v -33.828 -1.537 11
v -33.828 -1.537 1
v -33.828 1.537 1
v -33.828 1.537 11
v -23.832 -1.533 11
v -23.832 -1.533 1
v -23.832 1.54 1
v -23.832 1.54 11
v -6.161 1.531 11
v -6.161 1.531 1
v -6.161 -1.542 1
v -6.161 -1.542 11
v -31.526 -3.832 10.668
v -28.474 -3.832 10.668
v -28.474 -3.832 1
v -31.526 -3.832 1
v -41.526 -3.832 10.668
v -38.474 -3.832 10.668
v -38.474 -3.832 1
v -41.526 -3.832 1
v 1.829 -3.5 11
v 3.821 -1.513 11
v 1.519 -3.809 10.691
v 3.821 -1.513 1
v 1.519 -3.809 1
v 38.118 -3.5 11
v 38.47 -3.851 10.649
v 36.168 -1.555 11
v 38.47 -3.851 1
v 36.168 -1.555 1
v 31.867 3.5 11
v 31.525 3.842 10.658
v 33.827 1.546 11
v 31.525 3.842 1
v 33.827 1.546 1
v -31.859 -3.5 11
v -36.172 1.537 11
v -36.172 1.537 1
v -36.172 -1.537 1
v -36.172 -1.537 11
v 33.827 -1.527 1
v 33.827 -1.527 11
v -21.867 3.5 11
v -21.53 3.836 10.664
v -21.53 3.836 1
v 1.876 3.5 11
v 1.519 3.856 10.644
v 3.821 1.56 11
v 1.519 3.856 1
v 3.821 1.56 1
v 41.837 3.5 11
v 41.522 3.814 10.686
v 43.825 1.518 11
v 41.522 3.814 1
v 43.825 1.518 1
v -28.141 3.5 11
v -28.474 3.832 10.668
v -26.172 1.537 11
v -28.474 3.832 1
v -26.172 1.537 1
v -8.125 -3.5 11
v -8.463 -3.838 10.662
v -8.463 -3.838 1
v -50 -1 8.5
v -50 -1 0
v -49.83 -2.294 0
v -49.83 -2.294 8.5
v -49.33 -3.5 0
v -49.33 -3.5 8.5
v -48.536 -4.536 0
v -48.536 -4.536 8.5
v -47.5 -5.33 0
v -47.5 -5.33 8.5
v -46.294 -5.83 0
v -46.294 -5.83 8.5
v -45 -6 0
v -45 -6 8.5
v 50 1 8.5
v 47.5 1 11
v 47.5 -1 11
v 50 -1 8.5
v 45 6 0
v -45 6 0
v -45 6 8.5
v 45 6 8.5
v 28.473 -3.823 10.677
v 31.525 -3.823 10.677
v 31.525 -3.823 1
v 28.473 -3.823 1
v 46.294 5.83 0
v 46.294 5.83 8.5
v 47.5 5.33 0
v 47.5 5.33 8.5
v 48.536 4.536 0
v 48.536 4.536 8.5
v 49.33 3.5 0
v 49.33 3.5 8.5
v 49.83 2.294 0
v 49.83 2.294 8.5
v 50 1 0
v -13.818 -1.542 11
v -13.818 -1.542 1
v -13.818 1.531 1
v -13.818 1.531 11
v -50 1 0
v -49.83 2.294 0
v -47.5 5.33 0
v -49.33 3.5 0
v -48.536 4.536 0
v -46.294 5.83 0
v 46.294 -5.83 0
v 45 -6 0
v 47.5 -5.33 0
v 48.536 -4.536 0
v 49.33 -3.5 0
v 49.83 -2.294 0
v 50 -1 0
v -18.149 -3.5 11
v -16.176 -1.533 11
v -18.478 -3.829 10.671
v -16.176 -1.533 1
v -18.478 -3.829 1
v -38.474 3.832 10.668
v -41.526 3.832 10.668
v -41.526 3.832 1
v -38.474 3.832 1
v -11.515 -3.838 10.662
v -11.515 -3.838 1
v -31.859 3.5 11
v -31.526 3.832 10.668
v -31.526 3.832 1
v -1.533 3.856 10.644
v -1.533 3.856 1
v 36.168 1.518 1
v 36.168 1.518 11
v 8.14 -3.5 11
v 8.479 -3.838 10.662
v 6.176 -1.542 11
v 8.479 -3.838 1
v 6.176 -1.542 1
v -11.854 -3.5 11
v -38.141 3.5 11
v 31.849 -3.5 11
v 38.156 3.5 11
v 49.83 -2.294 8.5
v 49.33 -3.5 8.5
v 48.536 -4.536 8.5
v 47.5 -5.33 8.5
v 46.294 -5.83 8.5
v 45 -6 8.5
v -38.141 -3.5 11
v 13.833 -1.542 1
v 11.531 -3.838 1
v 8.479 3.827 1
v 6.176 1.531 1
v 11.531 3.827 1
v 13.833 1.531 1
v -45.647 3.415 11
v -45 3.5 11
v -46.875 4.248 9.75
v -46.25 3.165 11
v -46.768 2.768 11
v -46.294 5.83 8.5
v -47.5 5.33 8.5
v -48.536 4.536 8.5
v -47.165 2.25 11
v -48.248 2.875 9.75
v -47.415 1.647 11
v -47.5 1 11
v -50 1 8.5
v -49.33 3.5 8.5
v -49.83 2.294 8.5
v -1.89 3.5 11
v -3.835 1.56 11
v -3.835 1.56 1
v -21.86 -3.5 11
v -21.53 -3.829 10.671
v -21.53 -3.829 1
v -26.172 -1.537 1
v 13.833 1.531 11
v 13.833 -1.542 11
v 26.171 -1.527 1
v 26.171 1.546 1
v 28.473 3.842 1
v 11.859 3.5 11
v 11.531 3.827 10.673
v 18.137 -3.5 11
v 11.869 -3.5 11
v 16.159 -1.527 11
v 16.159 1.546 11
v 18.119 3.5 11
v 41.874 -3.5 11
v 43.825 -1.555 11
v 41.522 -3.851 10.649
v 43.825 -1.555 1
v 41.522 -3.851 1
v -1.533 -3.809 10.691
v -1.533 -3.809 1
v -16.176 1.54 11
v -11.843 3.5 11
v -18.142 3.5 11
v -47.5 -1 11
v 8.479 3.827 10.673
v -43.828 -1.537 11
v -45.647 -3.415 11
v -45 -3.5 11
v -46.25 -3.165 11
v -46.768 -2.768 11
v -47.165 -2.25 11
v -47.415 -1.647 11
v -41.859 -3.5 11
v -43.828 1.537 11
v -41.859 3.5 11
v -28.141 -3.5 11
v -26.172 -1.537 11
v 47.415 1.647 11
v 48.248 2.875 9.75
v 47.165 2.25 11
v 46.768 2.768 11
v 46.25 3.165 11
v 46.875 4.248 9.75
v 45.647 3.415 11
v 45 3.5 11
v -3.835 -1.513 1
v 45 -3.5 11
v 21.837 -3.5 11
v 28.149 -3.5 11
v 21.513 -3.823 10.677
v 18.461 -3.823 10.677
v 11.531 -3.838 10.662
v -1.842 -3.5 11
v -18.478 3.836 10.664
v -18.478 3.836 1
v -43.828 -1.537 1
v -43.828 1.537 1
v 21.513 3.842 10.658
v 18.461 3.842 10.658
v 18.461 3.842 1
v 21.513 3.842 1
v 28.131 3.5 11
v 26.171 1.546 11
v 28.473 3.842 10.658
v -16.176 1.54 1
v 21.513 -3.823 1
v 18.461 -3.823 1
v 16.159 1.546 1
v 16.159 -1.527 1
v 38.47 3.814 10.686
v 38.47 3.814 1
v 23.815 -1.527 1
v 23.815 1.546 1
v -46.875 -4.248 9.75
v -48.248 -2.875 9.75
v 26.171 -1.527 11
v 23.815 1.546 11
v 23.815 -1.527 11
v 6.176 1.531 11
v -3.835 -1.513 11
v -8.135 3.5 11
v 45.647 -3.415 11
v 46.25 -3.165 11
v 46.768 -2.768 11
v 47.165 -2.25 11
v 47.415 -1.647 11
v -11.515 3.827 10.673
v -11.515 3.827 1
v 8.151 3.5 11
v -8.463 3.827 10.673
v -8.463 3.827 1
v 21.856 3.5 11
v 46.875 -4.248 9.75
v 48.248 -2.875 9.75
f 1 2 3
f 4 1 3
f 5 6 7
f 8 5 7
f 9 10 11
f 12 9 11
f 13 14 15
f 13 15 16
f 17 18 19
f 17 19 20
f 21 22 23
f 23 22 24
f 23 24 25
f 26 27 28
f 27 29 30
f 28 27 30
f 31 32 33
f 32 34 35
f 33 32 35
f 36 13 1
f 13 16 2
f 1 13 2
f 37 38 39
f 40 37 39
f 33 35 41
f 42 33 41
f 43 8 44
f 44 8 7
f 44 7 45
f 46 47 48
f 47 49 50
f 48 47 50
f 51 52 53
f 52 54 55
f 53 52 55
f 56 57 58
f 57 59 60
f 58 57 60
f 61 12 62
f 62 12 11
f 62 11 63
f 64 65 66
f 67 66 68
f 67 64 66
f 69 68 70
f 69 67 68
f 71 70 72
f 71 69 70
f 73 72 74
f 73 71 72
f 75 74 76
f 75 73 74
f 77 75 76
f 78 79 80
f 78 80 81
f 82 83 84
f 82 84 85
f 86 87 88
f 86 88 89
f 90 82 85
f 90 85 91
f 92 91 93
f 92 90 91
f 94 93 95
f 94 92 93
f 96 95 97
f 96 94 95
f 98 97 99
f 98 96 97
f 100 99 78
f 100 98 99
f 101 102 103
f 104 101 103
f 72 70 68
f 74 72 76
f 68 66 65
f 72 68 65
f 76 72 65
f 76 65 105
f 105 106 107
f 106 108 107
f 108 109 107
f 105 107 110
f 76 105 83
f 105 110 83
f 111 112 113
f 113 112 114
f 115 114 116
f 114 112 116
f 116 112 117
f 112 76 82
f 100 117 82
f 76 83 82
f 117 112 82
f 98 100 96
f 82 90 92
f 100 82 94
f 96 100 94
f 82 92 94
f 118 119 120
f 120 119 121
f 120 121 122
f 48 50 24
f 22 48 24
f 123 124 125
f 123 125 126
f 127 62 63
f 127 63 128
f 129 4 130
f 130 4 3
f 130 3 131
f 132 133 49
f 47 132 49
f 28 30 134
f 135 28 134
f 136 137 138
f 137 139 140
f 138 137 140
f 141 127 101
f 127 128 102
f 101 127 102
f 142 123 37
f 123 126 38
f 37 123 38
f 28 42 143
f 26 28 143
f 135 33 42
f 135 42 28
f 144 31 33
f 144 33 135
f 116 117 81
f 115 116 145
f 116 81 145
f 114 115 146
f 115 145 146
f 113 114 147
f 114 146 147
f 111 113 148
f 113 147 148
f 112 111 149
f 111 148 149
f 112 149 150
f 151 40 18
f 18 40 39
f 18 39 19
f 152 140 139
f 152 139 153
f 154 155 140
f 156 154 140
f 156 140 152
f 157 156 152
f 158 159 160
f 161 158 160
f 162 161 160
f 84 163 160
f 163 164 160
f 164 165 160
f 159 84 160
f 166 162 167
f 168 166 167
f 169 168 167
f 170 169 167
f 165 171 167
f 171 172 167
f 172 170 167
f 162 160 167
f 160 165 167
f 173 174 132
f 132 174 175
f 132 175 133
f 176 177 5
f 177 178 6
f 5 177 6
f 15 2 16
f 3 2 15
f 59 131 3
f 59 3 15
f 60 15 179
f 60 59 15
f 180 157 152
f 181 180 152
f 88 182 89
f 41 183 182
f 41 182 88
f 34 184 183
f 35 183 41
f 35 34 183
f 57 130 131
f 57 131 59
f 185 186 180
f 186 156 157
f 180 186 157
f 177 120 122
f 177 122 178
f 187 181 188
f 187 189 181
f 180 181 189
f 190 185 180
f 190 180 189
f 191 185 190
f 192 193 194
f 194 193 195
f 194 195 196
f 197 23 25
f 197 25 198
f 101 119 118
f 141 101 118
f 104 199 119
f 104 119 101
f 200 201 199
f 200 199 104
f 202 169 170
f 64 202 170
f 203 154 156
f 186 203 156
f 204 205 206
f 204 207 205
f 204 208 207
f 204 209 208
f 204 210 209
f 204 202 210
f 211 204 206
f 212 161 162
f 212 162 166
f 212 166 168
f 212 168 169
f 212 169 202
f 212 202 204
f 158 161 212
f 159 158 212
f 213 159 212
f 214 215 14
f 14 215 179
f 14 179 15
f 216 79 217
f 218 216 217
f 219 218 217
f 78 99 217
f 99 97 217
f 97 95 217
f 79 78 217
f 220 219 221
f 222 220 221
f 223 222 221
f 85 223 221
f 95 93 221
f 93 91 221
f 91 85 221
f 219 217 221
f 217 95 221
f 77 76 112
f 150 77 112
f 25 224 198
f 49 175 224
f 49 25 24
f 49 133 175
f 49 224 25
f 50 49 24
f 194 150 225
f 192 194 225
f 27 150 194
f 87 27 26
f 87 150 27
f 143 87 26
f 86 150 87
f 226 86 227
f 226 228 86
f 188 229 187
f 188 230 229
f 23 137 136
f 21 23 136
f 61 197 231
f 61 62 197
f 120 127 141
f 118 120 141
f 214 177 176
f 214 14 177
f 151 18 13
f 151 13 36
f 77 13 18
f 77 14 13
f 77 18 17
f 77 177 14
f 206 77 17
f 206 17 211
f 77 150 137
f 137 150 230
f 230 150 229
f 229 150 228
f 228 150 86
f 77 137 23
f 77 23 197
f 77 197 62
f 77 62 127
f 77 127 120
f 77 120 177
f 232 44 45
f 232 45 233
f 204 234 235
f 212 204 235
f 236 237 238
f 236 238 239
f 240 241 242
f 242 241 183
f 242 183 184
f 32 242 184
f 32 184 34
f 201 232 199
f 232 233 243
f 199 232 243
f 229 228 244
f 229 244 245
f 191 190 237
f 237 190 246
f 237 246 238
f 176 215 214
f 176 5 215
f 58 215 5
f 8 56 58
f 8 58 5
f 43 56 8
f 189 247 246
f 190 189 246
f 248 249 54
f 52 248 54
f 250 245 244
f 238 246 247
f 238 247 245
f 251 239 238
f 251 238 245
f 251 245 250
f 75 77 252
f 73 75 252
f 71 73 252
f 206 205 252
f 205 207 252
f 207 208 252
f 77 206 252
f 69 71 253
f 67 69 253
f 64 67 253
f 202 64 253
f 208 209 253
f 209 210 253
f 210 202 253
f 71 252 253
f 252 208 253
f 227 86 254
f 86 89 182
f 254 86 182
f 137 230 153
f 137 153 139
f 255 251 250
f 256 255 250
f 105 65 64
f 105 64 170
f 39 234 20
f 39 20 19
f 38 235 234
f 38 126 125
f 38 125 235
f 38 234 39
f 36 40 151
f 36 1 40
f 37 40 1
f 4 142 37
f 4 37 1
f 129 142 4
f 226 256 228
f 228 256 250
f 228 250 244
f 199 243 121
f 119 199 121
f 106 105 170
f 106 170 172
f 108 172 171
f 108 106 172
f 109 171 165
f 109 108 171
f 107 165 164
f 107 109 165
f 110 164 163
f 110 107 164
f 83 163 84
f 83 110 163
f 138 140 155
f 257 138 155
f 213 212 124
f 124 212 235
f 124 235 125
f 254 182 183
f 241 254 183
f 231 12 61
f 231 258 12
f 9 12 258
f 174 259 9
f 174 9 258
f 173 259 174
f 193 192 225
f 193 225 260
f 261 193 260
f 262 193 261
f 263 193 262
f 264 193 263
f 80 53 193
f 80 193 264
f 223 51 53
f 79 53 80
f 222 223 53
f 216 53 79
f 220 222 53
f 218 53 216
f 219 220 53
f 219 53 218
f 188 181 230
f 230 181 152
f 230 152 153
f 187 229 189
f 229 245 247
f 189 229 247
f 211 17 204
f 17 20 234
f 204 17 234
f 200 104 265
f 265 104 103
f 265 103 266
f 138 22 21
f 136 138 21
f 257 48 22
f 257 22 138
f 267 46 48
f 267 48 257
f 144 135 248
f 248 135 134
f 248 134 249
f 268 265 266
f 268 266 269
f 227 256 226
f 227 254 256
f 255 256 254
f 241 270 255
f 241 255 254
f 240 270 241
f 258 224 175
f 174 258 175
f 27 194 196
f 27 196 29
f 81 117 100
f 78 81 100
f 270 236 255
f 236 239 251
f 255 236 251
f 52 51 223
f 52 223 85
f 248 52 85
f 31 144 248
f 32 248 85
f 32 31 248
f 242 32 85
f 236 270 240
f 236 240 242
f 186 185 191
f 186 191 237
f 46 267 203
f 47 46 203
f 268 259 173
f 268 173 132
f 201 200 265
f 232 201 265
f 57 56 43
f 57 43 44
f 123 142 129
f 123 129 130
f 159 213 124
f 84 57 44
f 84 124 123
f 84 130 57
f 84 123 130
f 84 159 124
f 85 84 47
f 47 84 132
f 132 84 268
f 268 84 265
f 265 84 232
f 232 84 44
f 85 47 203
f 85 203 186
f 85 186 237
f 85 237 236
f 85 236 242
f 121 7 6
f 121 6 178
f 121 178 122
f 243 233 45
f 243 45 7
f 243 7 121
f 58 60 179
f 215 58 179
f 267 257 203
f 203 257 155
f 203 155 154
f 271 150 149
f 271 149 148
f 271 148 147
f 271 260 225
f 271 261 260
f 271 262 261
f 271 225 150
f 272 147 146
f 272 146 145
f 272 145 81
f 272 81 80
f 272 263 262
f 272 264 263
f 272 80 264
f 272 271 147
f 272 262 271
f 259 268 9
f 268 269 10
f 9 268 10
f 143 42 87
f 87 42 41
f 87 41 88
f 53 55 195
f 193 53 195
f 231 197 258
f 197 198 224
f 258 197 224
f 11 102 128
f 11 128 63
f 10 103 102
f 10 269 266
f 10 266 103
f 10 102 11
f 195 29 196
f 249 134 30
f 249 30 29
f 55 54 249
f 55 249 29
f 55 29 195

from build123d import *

# Parameters (mm, degrees)
F0_W         = 100
F0_H         = 12
F1_DEPTH     = 11
F0_W_2       = 2.3021356216
F0_H_2       = 3.0731172886
F0_W_3       = 3.0519974387
F0_H_3       = 2.2957974076
F2_DEPTH     = 1
F3_R         = 5
F4_T1_DEPTH  = 90
F4_T3_DEPTH  = 2
F4_T6_ANGLE  = 90
F4_T8_ANGLE  = 90
F4_T10_ANGLE = 90
F4_T12_ANGLE = 90


# Not quite as in the source:
# - a fillet or chamfer that OpenCascade refuses, or shapes differently, is made with other operations: its cross-section is extruded or revolved along the edge and cut away or added


with BuildPart() as f1:
    # F0 (on Top) → F1 (new body)
    with BuildSketch(Plane.XY):
        Rectangle(F0_W, F0_H)
        Polygon((-43.828134341, 1.5365586443), (-41.5259987194, 3.8323560519), (-38.4740012806, 3.8323560519), (-36.171865659, 1.5365586443), (-36.171865659, -1.5365586443), (-38.4740012806, -3.8323560519), (-41.5259987194, -3.8323560519), (-43.828134341, -1.5365586443), align=None, mode=Mode.SUBTRACT)
        Polygon((-13.8175263533, 1.5313583214), (-11.5153907317, 3.827155729), (-8.463393293, 3.827155729), (-6.1612576714, 1.5313583214), (-6.1612576714, -1.5417589672), (-8.463393293, -3.8375563748), (-11.5153907317, -3.8375563748), (-13.8175263533, -1.5417589672), align=None, mode=Mode.SUBTRACT)
        Polygon((6.1764764136, 1.531357914), (8.4786120352, 3.8271553215), (11.5306094739, 3.8271553215), (13.8327450955, 1.531357914), (13.8327450955, -1.5417593747), (11.5306094739, -3.8375567823), (8.4786120352, -3.8375567823), (6.1764764136, -1.5417593747), align=None, mode=Mode.SUBTRACT)
        Polygon((36.1682959368, 1.5178143587), (38.4704315585, 3.8136117663), (41.5224289972, 3.8136117663), (43.8245646188, 1.5178143587), (43.8245646188, -1.5553029299), (41.5224289972, -3.8511003375), (38.4704315585, -3.8511003375), (36.1682959368, -1.5553029299), align=None, mode=Mode.SUBTRACT)
        Polygon((-33.8281344609, 1.5365587602), (-31.5259988393, 3.8323561678), (-28.4740014006, 3.8323561678), (-26.1718657789, 1.5365587602), (-26.1718657789, -1.5365585284), (-28.4740014006, -3.832355936), (-31.5259988393, -3.832355936), (-33.8281344609, -1.5365585284), align=None, mode=Mode.SUBTRACT)
        Polygon((-23.8324813077, 1.5400278102), (-21.5303456861, 3.8358252178), (-18.4783482474, 3.8358252178), (-16.1762126258, 1.5400278102), (-16.1762126258, -1.5330894784), (-18.4783482474, -3.828886886), (-21.5303456861, -3.828886886), (-23.8324813077, -1.5330894784), align=None, mode=Mode.SUBTRACT)
        Polygon((-3.8348879394, 1.5600861226), (-1.5327523178, 3.8558835302), (1.5192451209, 3.8558835302), (3.8213807426, 1.5600861226), (3.8213807426, -1.513031166), (1.5192451209, -3.8088285736), (-1.5327523178, -3.8088285736), (-3.8348879394, -1.513031166), align=None, mode=Mode.SUBTRACT)
        Polygon((16.1591154059, 1.5457221845), (18.4612510276, 3.8415195921), (21.5132484663, 3.8415195921), (23.8153840879, 1.5457221845), (23.8153840879, -1.5273951041), (21.5132484663, -3.8231925117), (18.4612510276, -3.8231925117), (16.1591154059, -1.5273951041), align=None, mode=Mode.SUBTRACT)
        Polygon((26.1708870998, 1.5457229285), (28.4730227214, 3.8415203361), (31.5250201601, 3.8415203361), (33.8271557817, 1.5457229285), (33.8271557817, -1.5273943601), (31.5250201601, -3.8231917677), (28.4730227214, -3.8231917677), (26.1708870998, -1.5273943601), align=None, mode=Mode.SUBTRACT)
    extrude(amount=F1_DEPTH)

    # F0 (on Top) → F2 (join)
    with BuildSketch(Plane.XY):
        Rectangle(F0_W, F0_H)
        Polygon((-43.828134341, 1.5365586443), (-41.5259987194, 3.8323560519), (-38.4740012806, 3.8323560519), (-36.171865659, 1.5365586443), (-36.171865659, -1.5365586443), (-38.4740012806, -3.8323560519), (-41.5259987194, -3.8323560519), (-43.828134341, -1.5365586443), align=None, mode=Mode.SUBTRACT)
        Polygon((-13.8175263533, 1.5313583214), (-11.5153907317, 3.827155729), (-8.463393293, 3.827155729), (-6.1612576714, 1.5313583214), (-6.1612576714, -1.5417589672), (-8.463393293, -3.8375563748), (-11.5153907317, -3.8375563748), (-13.8175263533, -1.5417589672), align=None, mode=Mode.SUBTRACT)
        Polygon((6.1764764136, 1.531357914), (8.4786120352, 3.8271553215), (11.5306094739, 3.8271553215), (13.8327450955, 1.531357914), (13.8327450955, -1.5417593747), (11.5306094739, -3.8375567823), (8.4786120352, -3.8375567823), (6.1764764136, -1.5417593747), align=None, mode=Mode.SUBTRACT)
        Polygon((36.1682959368, 1.5178143587), (38.4704315585, 3.8136117663), (41.5224289972, 3.8136117663), (43.8245646188, 1.5178143587), (43.8245646188, -1.5553029299), (41.5224289972, -3.8511003375), (38.4704315585, -3.8511003375), (36.1682959368, -1.5553029299), align=None, mode=Mode.SUBTRACT)
        Polygon((-33.8281344609, 1.5365587602), (-31.5259988393, 3.8323561678), (-28.4740014006, 3.8323561678), (-26.1718657789, 1.5365587602), (-26.1718657789, -1.5365585284), (-28.4740014006, -3.832355936), (-31.5259988393, -3.832355936), (-33.8281344609, -1.5365585284), align=None, mode=Mode.SUBTRACT)
        Polygon((-23.8324813077, 1.5400278102), (-21.5303456861, 3.8358252178), (-18.4783482474, 3.8358252178), (-16.1762126258, 1.5400278102), (-16.1762126258, -1.5330894784), (-18.4783482474, -3.828886886), (-21.5303456861, -3.828886886), (-23.8324813077, -1.5330894784), align=None, mode=Mode.SUBTRACT)
        Polygon((-3.8348879394, 1.5600861226), (-1.5327523178, 3.8558835302), (1.5192451209, 3.8558835302), (3.8213807426, 1.5600861226), (3.8213807426, -1.513031166), (1.5192451209, -3.8088285736), (-1.5327523178, -3.8088285736), (-3.8348879394, -1.513031166), align=None, mode=Mode.SUBTRACT)
        Polygon((16.1591154059, 1.5457221845), (18.4612510276, 3.8415195921), (21.5132484663, 3.8415195921), (23.8153840879, 1.5457221845), (23.8153840879, -1.5273951041), (21.5132484663, -3.8231925117), (18.4612510276, -3.8231925117), (16.1591154059, -1.5273951041), align=None, mode=Mode.SUBTRACT)
        Polygon((26.1708870998, 1.5457229285), (28.4730227214, 3.8415203361), (31.5250201601, 3.8415203361), (33.8271557817, 1.5457229285), (33.8271557817, -1.5273943601), (31.5250201601, -3.8231917677), (28.4730227214, -3.8231917677), (26.1708870998, -1.5273943601), align=None, mode=Mode.SUBTRACT)
        with Locations((-42.6770665302, 0)):
            Rectangle(F0_W_2, F0_H_2)
        Polygon((-41.5259987194, 1.5365586443), (-41.5259987194, 3.8323560519), (-43.828134341, 1.5365586443), align=None)
        with Locations((-40, 2.6844573481)):
            Rectangle(F0_W_3, F0_H_3)
        Polygon((-41.5259987194, -3.8323560519), (-41.5259987194, -1.5365586443), (-43.828134341, -1.5365586443), align=None)
        with Locations((-40, -2.6844573481)):
            Rectangle(F0_W_3, F0_H_3)
        with Locations((-40, 0)):
            Rectangle(F0_W_3, F0_H_2)
        with Locations((-37.3229334698, 0)):
            Rectangle(F0_W_2, F0_H_2)
        Polygon((-36.171865659, 1.5365586443), (-38.4740012806, 3.8323560519), (-38.4740012806, 1.5365586443), align=None)
        Polygon((-36.171865659, -1.5365586443), (-38.4740012806, -1.5365586443), (-38.4740012806, -3.8323560519), align=None)
        Polygon((-31.5259988393, -3.832355936), (-31.5259988393, -1.5365585284), (-33.8281344609, -1.5365585284), align=None)
        with Locations((-32.6770666501, 1.159e-07)):
            Rectangle(F0_W_2, F0_H_2)
        Polygon((-31.5259988393, 1.5365587602), (-31.5259988393, 3.8323561678), (-33.8281344609, 1.5365587602), align=None)
        with Locations((-30.0000001199, 2.684457464)):
            Rectangle(F0_W_3, F0_H_3)
        Polygon((-26.1718657789, 1.5365587602), (-28.4740014006, 3.8323561678), (-28.4740014006, 1.5365587602), align=None)
        with Locations((-27.3229335898, 1.159e-07)):
            Rectangle(F0_W_2, F0_H_2)
        with Locations((-30.0000001199, 1.159e-07)):
            Rectangle(F0_W_3, F0_H_2)
        with Locations((-30.0000001199, -2.6844572322)):
            Rectangle(F0_W_3, F0_H_3)
        Polygon((-26.1718657789, -1.5365585284), (-28.4740014006, -1.5365585284), (-28.4740014006, -3.832355936), align=None)
        Polygon((-21.5303456861, -3.828886886), (-21.5303456861, -1.5330894784), (-23.8324813077, -1.5330894784), align=None)
        with Locations((-22.6814134969, 0.0034691659)):
            Rectangle(F0_W_2, F0_H_2)
        Polygon((-21.5303456861, 1.5400278102), (-21.5303456861, 3.8358252178), (-23.8324813077, 1.5400278102), align=None)
        with Locations((-20.0043469667, 2.687926514)):
            Rectangle(F0_W_3, F0_H_3)
        with Locations((-20.0043469667, 0.0034691659)):
            Rectangle(F0_W_3, F0_H_2)
        with Locations((-20.0043469667, -2.6809881822)):
            Rectangle(F0_W_3, F0_H_3)
        Polygon((-16.1762126258, -1.5330894784), (-18.4783482474, -1.5330894784), (-18.4783482474, -3.828886886), align=None)
        with Locations((-17.3272804366, 0.0034691659)):
            Rectangle(F0_W_2, F0_H_2)
        Polygon((-16.1762126258, 1.5400278102), (-18.4783482474, 3.8358252178), (-18.4783482474, 1.5400278102), align=None)
        Polygon((-11.5153907317, 1.5313583214), (-11.5153907317, 3.827155729), (-13.8175263533, 1.5313583214), align=None)
        with Locations((-12.6664585425, -0.0052003229)):
            Rectangle(F0_W_2, F0_H_2)
        Polygon((-11.5153907317, -3.8375563748), (-11.5153907317, -1.5417589672), (-13.8175263533, -1.5417589672), align=None)
        with Locations((-9.9893920124, -2.689657671)):
            Rectangle(F0_W_3, F0_H_3)
        with Locations((-9.9893920124, 2.6792570252)):
            Rectangle(F0_W_3, F0_H_3)
        with Locations((-7.3123254822, -0.0052003229)):
            Rectangle(F0_W_2, F0_H_2)
        Polygon((-6.1612576714, 1.5313583214), (-8.463393293, 3.827155729), (-8.463393293, 1.5313583214), align=None)
        Polygon((-6.1612576714, -1.5417589672), (-8.463393293, -1.5417589672), (-8.463393293, -3.8375563748), align=None)
        with Locations((-9.9893920124, -0.0052003229)):
            Rectangle(F0_W_3, F0_H_2)
        Polygon((-1.5327523178, 1.5600861226), (-1.5327523178, 3.8558835302), (-3.8348879394, 1.5600861226), align=None)
        with Locations((-0.0067535984, 2.7079848264)):
            Rectangle(F0_W_3, F0_H_3)
        Polygon((3.8213807426, 1.5600861226), (1.5192451209, 3.8558835302), (1.5192451209, 1.5600861226), align=None)
        with Locations((2.6703129317, 0.0235274783)):
            Rectangle(F0_W_2, F0_H_2)
        with Locations((-0.0067535984, 0.0235274783)):
            Rectangle(F0_W_3, F0_H_2)
        with Locations((-2.6838201286, 0.0235274783)):
            Rectangle(F0_W_2, F0_H_2)
        with Locations((-0.0067535984, -2.6609298698)):
            Rectangle(F0_W_3, F0_H_3)
        Polygon((3.8213807426, -1.513031166), (1.5192451209, -1.513031166), (1.5192451209, -3.8088285736), align=None)
        Polygon((-1.5327523178, -3.8088285736), (-1.5327523178, -1.513031166), (-3.8348879394, -1.513031166), align=None)
        with Locations((7.3275442244, -0.0052007304)):
            Rectangle(F0_W_2, F0_H_2)
        Polygon((8.4786120352, 1.531357914), (8.4786120352, 3.8271553215), (6.1764764136, 1.531357914), align=None)
        with Locations((10.0046107545, 2.6792566177)):
            Rectangle(F0_W_3, F0_H_3)
        Polygon((13.8327450955, 1.531357914), (11.5306094739, 3.8271553215), (11.5306094739, 1.531357914), align=None)
        with Locations((12.6816772847, -0.0052007304)):
            Rectangle(F0_W_2, F0_H_2)
        with Locations((10.0046107545, -0.0052007304)):
            Rectangle(F0_W_3, F0_H_2)
        Polygon((8.4786120352, -3.8375567823), (8.4786120352, -1.5417593747), (6.1764764136, -1.5417593747), align=None)
        with Locations((10.0046107545, -2.6896580785)):
            Rectangle(F0_W_3, F0_H_3)
        Polygon((13.8327450955, -1.5417593747), (11.5306094739, -1.5417593747), (11.5306094739, -3.8375567823), align=None)
        with Locations((17.3101832167, 0.0091635402)):
            Rectangle(F0_W_2, F0_H_2)
        Polygon((18.4612510276, -3.8231925117), (18.4612510276, -1.5273951041), (16.1591154059, -1.5273951041), align=None)
        with Locations((19.9872497469, -2.6752938079)):
            Rectangle(F0_W_3, F0_H_3)
        Polygon((23.8153840879, -1.5273951041), (21.5132484663, -1.5273951041), (21.5132484663, -3.8231925117), align=None)
        with Locations((22.6643162771, 0.0091635402)):
            Rectangle(F0_W_2, F0_H_2)
        with Locations((19.9872497469, 0.0091635402)):
            Rectangle(F0_W_3, F0_H_2)
        with Locations((19.9872497469, 2.6936208883)):
            Rectangle(F0_W_3, F0_H_3)
        Polygon((18.4612510276, 1.5457221845), (18.4612510276, 3.8415195921), (16.1591154059, 1.5457221845), align=None)
        Polygon((23.8153840879, 1.5457221845), (21.5132484663, 3.8415195921), (21.5132484663, 1.5457221845), align=None)
        Polygon((28.4730227214, 1.5457229285), (28.4730227214, 3.8415203361), (26.1708870998, 1.5457229285), align=None)
        with Locations((27.3219549106, 0.0091642842)):
            Rectangle(F0_W_2, F0_H_2)
        Polygon((28.4730227214, -3.8231917677), (28.4730227214, -1.5273943601), (26.1708870998, -1.5273943601), align=None)
        with Locations((29.9990214407, -2.6752930639)):
            Rectangle(F0_W_3, F0_H_3)
        with Locations((29.9990214407, 0.0091642842)):
            Rectangle(F0_W_3, F0_H_2)
        with Locations((29.9990214407, 2.6936216323)):
            Rectangle(F0_W_3, F0_H_3)
        Polygon((33.8271557817, 1.5457229285), (31.5250201601, 3.8415203361), (31.5250201601, 1.5457229285), align=None)
        with Locations((32.6760879709, 0.0091642842)):
            Rectangle(F0_W_2, F0_H_2)
        Polygon((33.8271557817, -1.5273943601), (31.5250201601, -1.5273943601), (31.5250201601, -3.8231917677), align=None)
        with Locations((37.3193637477, -0.0187442856)):
            Rectangle(F0_W_2, F0_H_2)
        Polygon((38.4704315585, -3.8511003375), (38.4704315585, -1.5553029299), (36.1682959368, -1.5553029299), align=None)
        with Locations((39.9964302778, -2.7032016337)):
            Rectangle(F0_W_3, F0_H_3)
        with Locations((42.673496808, -0.0187442856)):
            Rectangle(F0_W_2, F0_H_2)
        with Locations((39.9964302778, 2.6657130625)):
            Rectangle(F0_W_3, F0_H_3)
        Polygon((38.4704315585, 1.5178143587), (38.4704315585, 3.8136117663), (36.1682959368, 1.5178143587), align=None)
        with Locations((39.9964302778, -0.0187442856)):
            Rectangle(F0_W_3, F0_H_2)
        Polygon((43.8245646188, 1.5178143587), (41.5224289972, 3.8136117663), (41.5224289972, 1.5178143587), align=None)
        Polygon((43.8245646188, -1.5553029299), (41.5224289972, -1.5553029299), (41.5224289972, -3.8511003375), align=None)
    extrude(amount=F2_DEPTH)

    # F3
    f3_edges = [f1.edges().sort_by_distance(p)[0] for p in [
        (-50, 6, 5.5),
        (50, -6, 5.5),
        (50, 6, 5.5),
        (-50, -6, 5.5),
    ]]
    fillet(f3_edges, radius=F3_R)

    # F4: chamfer of 2.5 on 8 edges, made by hand

    # F4_s2 → F4_t1 (cut)
    with BuildSketch(Plane.YZ.offset(-45)):
        Polygon((-6, 8.5), (-3.5, 11), (-6, 11), align=None)
        Polygon((3.5, 11), (6, 8.5), (6, 11), align=None)
    extrude(amount=F4_T1_DEPTH, mode=Mode.SUBTRACT)

    # F4_s4 → F4_t3 (cut)
    with BuildSketch(Plane.XZ.offset(-1)):
        Polygon((-47.5, 11), (-50, 8.5), (-50, 11), align=None)
        Polygon((47.5, 11), (50, 8.5), (50, 11), align=None)
    extrude(amount=F4_T3_DEPTH, mode=Mode.SUBTRACT)

    # F4_s5 → F4_t6 (revolve, cut)
    with BuildSketch(Plane.YZ.offset(-45)):
        Polygon((-6, 8.5), (-3.5, 11), (-6, 11), align=None)
    revolve(axis=Axis((-45, -1, 11), (0, 0, -1)), revolution_arc=F4_T6_ANGLE, mode=Mode.SUBTRACT)

    # F4_s7 → F4_t8 (revolve, cut)
    with BuildSketch(Plane.YZ.offset(45)):
        Polygon((-6, 8.5), (-3.5, 11), (-6, 11), align=None)
    revolve(axis=Axis((45, -1, 11), (0, 0, 1)), revolution_arc=F4_T8_ANGLE, mode=Mode.SUBTRACT)

    # F4_s9 → F4_t10 (revolve, cut)
    with BuildSketch(Plane.YZ.offset(-45)):
        Polygon((3.5, 11), (6, 8.5), (6, 11), align=None)
    revolve(axis=Axis((-45, 1, 11), (0, 0, 1)), revolution_arc=F4_T10_ANGLE, mode=Mode.SUBTRACT)

    # F4_s11 → F4_t12 (revolve, cut)
    with BuildSketch(Plane.XZ.offset(-1)):
        Polygon((47.5, 11), (50, 8.5), (50, 11), align=None)
    revolve(axis=Axis((45, 1, 11), (0, 0, 1)), revolution_arc=F4_T12_ANGLE, mode=Mode.SUBTRACT)


solid = f1.part
